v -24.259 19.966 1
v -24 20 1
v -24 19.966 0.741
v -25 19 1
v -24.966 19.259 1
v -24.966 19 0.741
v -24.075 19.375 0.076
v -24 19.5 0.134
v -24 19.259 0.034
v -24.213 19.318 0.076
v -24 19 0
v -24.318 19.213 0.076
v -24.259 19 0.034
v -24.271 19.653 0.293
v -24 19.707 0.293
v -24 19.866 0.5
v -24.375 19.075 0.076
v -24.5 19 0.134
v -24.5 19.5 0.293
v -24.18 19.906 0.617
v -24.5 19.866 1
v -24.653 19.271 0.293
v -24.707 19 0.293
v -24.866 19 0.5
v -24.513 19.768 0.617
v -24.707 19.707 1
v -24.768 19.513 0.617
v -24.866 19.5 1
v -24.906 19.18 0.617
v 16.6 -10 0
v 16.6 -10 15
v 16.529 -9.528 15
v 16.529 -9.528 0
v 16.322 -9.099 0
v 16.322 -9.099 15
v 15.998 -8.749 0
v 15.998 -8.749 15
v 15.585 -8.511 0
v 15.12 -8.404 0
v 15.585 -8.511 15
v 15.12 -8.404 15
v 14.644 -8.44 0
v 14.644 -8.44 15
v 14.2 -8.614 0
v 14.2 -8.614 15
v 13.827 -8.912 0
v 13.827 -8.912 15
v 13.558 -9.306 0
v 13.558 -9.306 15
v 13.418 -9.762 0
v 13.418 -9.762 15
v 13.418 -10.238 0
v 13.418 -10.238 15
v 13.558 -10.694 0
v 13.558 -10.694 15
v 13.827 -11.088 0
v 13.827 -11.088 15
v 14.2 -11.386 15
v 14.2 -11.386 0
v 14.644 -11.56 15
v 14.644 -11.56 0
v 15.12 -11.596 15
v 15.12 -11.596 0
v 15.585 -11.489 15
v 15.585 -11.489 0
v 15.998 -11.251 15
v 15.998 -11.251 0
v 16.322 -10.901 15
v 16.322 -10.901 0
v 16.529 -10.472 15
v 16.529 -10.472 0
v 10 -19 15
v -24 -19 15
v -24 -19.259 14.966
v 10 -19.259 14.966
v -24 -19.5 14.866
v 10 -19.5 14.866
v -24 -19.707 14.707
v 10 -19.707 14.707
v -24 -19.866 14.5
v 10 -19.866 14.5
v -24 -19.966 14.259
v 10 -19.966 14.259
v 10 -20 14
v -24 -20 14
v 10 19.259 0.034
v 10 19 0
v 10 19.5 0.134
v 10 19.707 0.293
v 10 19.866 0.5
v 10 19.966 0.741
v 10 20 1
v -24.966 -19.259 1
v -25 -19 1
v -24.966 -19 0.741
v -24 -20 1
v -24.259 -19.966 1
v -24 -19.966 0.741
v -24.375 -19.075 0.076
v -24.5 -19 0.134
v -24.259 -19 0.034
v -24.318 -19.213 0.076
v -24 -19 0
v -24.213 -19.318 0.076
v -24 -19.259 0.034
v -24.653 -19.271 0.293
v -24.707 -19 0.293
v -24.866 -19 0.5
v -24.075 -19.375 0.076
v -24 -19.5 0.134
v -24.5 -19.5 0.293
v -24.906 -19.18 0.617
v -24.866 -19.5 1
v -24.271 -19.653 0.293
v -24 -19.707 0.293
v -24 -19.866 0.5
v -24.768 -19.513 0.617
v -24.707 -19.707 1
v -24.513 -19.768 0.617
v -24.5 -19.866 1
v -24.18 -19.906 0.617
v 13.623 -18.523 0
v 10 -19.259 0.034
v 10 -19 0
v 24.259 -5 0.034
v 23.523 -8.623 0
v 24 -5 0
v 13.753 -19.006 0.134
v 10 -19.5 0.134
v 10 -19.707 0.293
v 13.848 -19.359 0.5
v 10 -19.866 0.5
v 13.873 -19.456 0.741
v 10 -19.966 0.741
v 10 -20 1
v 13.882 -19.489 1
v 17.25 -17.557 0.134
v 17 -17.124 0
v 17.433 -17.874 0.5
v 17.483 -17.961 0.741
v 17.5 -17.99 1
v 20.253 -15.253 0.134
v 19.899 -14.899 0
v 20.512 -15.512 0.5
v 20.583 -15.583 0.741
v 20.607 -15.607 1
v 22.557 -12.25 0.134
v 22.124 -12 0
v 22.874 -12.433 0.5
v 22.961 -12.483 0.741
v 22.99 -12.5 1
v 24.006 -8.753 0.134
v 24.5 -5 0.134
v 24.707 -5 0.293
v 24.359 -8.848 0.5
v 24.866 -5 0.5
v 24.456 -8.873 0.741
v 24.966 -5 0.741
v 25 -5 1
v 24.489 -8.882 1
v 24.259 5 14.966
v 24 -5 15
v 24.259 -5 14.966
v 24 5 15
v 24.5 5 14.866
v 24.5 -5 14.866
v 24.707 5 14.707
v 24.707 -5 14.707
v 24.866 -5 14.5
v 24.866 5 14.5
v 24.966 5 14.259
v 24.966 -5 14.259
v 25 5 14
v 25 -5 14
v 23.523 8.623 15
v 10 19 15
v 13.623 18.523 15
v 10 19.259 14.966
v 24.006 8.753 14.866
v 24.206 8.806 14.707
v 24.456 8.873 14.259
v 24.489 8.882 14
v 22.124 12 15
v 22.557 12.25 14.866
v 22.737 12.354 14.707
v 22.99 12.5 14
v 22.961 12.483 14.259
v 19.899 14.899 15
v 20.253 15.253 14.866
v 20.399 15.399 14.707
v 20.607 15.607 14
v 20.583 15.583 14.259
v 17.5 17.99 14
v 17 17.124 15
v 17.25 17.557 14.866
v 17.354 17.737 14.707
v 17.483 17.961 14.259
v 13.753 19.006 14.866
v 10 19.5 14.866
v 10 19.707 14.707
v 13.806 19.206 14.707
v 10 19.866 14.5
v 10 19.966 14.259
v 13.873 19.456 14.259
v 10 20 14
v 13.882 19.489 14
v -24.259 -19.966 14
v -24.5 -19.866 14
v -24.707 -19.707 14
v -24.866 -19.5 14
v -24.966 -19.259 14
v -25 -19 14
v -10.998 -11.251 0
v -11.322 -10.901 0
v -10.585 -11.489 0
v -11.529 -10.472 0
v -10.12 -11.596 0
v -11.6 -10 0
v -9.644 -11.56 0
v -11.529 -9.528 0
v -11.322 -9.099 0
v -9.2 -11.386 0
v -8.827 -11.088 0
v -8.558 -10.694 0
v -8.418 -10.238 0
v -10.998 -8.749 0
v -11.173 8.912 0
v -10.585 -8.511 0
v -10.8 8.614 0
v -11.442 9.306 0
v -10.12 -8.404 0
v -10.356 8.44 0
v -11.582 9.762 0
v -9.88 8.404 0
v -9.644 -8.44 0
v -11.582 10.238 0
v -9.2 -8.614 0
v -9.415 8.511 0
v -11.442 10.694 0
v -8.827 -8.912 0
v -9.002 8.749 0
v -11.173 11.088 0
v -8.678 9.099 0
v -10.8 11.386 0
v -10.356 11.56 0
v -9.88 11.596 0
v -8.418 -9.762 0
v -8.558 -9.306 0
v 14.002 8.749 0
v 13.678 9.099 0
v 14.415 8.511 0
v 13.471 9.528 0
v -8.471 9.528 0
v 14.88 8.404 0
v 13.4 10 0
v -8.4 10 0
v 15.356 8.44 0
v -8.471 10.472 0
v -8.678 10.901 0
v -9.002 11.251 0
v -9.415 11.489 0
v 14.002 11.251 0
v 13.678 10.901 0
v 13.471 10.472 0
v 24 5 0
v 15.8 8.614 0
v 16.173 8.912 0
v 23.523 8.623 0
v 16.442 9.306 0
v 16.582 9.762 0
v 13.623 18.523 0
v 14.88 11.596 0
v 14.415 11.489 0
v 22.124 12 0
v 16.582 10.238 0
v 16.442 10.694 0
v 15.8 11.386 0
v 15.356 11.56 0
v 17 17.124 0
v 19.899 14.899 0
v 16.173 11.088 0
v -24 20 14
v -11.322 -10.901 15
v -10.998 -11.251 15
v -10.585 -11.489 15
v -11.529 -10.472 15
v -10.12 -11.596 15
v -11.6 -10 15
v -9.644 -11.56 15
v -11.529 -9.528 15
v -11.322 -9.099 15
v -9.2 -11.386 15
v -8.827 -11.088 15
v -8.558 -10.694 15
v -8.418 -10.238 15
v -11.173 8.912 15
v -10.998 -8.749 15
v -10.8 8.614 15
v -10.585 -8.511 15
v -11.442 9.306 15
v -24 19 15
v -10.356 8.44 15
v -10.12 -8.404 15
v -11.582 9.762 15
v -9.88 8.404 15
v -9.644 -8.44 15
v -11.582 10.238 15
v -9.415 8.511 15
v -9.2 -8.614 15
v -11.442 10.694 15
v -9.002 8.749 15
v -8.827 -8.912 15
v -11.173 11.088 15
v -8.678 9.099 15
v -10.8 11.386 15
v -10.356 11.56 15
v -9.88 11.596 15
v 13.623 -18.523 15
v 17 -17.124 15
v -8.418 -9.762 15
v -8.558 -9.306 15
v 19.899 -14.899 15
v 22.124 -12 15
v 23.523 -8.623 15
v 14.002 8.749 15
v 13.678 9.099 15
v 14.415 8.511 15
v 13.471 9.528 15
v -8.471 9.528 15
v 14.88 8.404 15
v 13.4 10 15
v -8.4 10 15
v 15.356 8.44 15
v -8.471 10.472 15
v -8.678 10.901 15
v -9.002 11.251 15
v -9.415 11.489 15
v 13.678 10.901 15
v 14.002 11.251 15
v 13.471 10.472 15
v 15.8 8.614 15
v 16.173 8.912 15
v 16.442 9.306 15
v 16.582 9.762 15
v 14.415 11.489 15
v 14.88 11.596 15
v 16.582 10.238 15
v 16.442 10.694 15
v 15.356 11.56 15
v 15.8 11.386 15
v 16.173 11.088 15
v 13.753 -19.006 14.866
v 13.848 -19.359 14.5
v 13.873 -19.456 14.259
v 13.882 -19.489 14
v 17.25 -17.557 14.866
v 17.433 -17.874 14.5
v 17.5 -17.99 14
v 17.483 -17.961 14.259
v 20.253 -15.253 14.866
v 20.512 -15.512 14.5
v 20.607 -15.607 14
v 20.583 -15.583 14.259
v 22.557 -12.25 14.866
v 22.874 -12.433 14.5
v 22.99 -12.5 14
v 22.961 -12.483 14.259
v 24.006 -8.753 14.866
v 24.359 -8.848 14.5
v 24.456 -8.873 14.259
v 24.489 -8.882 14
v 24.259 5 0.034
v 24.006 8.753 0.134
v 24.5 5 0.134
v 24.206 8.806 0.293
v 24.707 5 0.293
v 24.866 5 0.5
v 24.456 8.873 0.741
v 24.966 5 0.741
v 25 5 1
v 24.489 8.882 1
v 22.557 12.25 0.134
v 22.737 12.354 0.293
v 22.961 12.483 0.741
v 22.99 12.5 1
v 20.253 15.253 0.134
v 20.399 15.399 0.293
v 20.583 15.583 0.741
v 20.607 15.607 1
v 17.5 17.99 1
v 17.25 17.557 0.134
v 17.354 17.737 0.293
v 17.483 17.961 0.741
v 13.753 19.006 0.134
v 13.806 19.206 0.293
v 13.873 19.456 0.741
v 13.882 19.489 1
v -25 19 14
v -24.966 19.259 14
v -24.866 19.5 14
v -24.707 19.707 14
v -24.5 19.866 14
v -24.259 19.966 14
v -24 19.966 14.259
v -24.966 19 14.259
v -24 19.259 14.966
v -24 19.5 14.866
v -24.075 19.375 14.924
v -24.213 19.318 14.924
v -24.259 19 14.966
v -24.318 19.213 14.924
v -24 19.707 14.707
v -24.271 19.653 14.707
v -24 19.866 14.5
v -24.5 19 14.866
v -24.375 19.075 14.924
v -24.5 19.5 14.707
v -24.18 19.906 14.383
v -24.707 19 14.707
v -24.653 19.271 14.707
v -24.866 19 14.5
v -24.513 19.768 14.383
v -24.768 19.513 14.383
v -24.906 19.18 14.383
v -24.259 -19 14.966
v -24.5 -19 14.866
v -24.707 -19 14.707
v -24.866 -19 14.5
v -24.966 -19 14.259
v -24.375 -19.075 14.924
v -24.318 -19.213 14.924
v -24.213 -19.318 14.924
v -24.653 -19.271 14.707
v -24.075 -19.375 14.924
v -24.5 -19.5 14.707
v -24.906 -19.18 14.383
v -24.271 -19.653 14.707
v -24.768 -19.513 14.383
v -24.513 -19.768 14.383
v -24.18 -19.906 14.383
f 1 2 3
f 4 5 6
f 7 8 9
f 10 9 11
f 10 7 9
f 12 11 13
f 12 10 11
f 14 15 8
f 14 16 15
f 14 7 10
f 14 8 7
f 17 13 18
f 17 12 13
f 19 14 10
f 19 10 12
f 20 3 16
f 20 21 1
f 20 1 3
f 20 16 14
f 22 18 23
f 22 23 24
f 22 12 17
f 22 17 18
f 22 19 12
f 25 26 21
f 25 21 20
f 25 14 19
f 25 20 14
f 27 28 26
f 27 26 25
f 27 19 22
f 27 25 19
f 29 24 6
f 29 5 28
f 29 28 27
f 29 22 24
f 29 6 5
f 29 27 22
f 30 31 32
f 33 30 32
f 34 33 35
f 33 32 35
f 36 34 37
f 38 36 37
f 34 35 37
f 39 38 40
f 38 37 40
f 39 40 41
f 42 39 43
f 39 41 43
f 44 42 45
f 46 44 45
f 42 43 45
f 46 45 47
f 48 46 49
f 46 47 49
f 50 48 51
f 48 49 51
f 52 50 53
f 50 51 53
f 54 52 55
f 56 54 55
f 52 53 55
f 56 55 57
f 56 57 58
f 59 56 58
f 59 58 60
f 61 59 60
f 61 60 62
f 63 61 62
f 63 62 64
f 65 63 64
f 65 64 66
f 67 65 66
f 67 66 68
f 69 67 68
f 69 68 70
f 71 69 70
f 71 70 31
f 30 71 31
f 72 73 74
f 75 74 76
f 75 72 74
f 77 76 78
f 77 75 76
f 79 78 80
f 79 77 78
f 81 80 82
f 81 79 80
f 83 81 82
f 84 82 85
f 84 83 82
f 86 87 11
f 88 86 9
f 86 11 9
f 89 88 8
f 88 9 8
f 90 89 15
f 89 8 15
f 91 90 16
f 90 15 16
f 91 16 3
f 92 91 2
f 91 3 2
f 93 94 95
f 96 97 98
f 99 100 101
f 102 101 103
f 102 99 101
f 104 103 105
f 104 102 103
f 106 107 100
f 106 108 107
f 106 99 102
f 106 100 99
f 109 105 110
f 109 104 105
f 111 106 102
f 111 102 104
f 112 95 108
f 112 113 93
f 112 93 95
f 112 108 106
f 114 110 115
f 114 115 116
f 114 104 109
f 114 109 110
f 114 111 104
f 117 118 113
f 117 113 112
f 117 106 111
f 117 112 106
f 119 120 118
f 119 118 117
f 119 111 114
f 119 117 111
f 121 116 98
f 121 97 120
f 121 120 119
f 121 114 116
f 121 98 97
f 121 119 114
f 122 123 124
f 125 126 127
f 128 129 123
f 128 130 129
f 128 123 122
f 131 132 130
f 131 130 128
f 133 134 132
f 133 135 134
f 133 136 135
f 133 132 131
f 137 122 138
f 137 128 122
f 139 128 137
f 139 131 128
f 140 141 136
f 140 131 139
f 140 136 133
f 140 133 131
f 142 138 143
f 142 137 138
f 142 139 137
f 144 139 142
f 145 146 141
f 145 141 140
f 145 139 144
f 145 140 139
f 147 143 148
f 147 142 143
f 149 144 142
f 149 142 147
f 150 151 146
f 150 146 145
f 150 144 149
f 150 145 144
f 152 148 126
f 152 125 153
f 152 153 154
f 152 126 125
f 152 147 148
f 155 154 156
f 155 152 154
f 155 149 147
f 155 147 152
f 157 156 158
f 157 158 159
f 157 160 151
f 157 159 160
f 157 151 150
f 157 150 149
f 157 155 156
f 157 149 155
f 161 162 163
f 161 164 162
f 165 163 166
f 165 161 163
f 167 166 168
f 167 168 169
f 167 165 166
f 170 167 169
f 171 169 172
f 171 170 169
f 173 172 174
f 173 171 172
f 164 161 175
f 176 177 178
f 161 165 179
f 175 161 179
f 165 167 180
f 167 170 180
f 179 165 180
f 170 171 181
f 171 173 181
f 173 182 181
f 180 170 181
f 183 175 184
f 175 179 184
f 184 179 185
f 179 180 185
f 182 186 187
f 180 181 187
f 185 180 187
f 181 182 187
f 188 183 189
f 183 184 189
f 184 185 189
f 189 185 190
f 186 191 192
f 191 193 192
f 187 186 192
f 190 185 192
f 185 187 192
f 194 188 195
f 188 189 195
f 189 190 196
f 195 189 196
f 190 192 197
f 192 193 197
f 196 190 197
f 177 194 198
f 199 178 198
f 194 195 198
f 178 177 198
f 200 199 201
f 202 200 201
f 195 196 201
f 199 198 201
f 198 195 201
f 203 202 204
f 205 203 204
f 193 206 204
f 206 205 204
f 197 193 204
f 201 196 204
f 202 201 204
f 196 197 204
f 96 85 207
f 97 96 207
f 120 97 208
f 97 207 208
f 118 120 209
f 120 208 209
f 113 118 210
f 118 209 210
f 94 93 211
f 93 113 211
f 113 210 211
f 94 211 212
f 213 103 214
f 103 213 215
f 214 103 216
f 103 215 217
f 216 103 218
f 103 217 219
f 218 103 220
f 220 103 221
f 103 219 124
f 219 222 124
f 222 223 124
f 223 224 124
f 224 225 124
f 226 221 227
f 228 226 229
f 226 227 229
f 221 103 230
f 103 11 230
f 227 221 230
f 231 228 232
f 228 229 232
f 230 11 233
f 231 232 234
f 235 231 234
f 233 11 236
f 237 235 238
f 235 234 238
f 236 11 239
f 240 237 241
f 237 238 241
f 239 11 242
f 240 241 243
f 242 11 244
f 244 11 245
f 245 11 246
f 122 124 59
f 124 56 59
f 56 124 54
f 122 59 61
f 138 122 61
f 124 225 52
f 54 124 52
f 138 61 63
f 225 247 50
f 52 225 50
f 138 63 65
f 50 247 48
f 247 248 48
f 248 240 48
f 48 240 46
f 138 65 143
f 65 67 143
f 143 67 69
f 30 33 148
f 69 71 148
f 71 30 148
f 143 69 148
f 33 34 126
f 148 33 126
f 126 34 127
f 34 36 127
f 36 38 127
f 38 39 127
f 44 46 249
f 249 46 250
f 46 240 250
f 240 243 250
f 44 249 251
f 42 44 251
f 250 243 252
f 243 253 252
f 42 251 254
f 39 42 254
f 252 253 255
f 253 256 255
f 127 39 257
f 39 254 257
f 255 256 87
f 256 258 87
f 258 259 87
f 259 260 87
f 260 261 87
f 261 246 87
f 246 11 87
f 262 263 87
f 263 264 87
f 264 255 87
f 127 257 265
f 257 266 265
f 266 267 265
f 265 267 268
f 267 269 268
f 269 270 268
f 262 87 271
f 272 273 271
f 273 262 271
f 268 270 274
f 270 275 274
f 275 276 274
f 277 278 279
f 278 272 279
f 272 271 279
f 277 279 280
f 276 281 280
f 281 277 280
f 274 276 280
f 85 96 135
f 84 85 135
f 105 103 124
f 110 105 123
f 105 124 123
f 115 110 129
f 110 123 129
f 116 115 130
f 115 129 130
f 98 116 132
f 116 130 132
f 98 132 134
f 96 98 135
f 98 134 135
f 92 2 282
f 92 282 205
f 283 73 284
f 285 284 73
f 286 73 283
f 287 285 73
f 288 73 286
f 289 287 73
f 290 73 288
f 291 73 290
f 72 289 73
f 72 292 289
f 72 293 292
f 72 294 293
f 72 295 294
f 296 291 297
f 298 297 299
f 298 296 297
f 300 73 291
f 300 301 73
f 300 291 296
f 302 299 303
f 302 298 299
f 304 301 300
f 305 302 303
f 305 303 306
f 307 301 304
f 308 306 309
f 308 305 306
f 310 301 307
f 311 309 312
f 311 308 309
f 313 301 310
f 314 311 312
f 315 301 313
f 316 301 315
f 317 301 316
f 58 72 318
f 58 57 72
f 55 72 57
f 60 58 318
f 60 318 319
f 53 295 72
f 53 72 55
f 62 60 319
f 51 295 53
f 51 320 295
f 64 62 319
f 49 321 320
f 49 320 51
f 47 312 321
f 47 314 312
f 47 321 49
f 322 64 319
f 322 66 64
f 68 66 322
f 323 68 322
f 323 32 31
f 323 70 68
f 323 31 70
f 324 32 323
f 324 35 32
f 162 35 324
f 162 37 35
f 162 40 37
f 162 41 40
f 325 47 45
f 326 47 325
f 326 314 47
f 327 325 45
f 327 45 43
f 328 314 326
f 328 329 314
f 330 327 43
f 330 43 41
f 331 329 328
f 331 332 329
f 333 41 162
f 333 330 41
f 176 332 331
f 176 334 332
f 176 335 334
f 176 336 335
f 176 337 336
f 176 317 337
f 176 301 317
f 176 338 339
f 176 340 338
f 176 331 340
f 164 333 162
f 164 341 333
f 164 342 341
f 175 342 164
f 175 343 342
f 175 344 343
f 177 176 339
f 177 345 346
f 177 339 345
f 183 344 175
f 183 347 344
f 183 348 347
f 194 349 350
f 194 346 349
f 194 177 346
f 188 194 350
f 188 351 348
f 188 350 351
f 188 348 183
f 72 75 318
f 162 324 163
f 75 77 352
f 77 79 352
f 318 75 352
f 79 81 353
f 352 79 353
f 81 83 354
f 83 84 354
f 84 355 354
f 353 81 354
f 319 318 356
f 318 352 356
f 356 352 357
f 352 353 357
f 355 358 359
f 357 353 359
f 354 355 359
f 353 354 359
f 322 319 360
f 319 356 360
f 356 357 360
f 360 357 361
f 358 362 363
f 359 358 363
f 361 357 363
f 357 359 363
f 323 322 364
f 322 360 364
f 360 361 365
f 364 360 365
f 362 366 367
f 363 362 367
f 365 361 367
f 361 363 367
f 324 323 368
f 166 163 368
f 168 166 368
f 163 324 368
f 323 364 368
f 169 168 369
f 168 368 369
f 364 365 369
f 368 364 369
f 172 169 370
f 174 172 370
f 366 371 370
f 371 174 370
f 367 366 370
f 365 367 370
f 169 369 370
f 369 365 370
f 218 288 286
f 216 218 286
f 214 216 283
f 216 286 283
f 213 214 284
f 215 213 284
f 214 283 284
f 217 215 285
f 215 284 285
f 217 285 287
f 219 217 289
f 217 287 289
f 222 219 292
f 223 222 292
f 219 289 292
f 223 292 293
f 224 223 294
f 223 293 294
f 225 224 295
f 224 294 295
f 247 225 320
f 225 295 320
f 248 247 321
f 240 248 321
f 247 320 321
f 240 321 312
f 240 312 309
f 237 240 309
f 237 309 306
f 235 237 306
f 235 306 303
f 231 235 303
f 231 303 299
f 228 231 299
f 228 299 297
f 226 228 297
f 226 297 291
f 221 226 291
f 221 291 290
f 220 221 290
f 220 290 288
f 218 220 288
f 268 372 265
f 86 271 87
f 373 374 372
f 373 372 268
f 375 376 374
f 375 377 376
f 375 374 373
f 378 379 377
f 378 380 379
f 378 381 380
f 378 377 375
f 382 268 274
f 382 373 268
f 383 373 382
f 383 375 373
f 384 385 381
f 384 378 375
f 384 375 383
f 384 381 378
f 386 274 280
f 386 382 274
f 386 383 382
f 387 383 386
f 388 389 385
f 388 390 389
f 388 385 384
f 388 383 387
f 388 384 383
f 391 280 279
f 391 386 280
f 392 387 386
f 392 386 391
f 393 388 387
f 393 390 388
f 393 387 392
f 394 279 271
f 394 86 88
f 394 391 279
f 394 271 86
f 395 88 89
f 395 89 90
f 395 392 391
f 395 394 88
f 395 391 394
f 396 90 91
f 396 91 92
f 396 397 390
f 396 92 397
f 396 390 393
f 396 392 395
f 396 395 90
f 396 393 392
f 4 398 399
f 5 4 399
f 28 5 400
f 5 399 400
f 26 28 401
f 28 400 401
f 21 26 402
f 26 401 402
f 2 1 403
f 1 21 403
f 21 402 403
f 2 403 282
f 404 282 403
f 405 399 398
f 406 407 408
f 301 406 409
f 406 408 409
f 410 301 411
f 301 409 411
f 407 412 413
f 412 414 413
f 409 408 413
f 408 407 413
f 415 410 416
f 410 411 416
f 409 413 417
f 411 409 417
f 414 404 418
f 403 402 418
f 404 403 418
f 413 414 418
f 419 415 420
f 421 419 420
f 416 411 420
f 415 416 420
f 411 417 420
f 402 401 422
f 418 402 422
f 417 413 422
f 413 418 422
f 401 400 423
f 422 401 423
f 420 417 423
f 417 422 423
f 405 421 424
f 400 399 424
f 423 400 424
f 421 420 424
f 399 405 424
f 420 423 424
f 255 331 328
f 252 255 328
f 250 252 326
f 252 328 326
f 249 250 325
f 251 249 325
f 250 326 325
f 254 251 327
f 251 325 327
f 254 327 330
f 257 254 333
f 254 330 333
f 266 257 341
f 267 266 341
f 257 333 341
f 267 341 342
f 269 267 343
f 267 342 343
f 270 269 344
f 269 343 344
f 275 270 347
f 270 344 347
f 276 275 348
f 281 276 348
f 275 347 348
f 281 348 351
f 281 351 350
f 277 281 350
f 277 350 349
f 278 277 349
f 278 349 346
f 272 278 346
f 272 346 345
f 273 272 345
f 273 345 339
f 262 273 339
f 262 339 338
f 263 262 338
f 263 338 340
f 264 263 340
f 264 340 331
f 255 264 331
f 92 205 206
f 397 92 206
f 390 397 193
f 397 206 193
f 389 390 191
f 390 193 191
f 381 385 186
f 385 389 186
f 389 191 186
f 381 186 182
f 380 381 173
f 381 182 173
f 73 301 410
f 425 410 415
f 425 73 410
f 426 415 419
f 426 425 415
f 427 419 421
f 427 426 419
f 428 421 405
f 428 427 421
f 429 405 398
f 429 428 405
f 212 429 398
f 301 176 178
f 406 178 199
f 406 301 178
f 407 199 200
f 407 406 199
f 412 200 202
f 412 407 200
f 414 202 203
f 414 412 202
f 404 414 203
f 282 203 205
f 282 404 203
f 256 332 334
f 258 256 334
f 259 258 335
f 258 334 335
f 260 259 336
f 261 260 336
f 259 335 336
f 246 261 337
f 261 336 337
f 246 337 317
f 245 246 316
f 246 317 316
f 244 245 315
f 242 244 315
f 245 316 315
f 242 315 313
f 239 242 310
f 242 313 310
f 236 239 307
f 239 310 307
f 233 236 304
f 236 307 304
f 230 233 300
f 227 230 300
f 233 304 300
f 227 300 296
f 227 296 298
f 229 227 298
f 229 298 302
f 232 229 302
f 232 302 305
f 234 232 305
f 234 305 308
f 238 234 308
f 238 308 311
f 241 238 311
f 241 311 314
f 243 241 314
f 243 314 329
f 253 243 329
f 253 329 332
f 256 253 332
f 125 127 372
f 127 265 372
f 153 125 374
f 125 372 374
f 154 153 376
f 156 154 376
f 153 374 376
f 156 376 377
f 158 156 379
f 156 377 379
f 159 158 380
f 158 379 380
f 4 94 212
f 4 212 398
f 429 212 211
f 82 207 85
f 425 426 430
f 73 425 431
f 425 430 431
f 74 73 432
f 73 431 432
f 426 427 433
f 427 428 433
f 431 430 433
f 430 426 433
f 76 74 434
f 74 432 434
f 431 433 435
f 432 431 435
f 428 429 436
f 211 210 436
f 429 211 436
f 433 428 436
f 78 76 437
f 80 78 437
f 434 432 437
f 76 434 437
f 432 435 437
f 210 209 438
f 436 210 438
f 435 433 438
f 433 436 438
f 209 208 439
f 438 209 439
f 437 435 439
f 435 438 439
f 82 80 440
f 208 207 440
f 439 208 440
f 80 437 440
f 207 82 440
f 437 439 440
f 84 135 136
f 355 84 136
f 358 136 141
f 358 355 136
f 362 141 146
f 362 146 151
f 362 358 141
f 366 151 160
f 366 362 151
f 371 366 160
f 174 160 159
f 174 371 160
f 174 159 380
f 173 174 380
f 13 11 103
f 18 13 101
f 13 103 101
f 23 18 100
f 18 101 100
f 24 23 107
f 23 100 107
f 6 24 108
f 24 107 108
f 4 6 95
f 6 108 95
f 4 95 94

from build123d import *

# Parameters (mm, degrees)
SKETCH_1_W          = 50
SKETCH_1_H          = 40
EXTRUDE_1_DEPTH     = 15
SKETCH_2_R          = 1.6
CUT_EXTRUDE_1_DEPTH = 36.355339059
FILLET_1_R          = 15
FILLET_2_R          = 1
FILLET_3_R          = 1


with BuildPart() as part:
    # 草图1 → 凸台-拉伸1 (new body)
    with BuildSketch(Plane.XY):
        Rectangle(SKETCH_1_W, SKETCH_1_H)
    extrude(amount=EXTRUDE_1_DEPTH)

    # 草图2 → 切除-拉伸1 (cut, through all)
    with BuildSketch(Plane.XY.offset(15)):
        with Locations((-10, 10)):
            Circle(SKETCH_2_R)
        with Locations(Location((15, 10, 0), (0, 0, 180))):
            Circle(SKETCH_2_R)
        with Locations((15, -10)):
            Circle(SKETCH_2_R)
        with Locations(Location((-10, -10, 0), (0, 0, 180))):
            Circle(SKETCH_2_R)
    extrude(amount=-CUT_EXTRUDE_1_DEPTH, mode=Mode.SUBTRACT)

    # 圆角1
    fillet_1_edges = [part.edges().sort_by_distance(p)[0] for p in [
        (25, -20, 7.5),
        (25, 20, 7.5),
    ]]
    fillet(fillet_1_edges, radius=FILLET_1_R)

    # 圆角2
    fillet_2_edges = [part.edges().sort_by_distance(p)[0] for p in [
        (-25, -20, 7.5),
        (-25, 20, 7.5),
    ]]
    fillet(fillet_2_edges, radius=FILLET_2_R)

    # 圆角3
    fillet_3_edges = [part.edges().sort_by_distance(p)[0] for p in [
        (25, 0, 0),
        (25, 0, 15),
        (-7, 20, 0),
        (20.606601718, 15.606601718, 0),
        (20.606601718, -15.606601718, 0),
        (-7, 20, 15),
        (20.606601718, 15.606601718, 15),
        (20.606601718, -15.606601718, 15),
        (-7, -20, 0),
        (-7, -20, 15),
        (-25, 0, 0),
        (-24.707106781, 19.707106781, 0),
        (-24.707106781, -19.707106781, 0),
        (-25, 0, 15),
        (-24.707106781, 19.707106781, 15),
        (-24.707106781, -19.707106781, 15),
    ]]
    fillet(fillet_3_edges, radius=FILLET_3_R)


solid = part.part
